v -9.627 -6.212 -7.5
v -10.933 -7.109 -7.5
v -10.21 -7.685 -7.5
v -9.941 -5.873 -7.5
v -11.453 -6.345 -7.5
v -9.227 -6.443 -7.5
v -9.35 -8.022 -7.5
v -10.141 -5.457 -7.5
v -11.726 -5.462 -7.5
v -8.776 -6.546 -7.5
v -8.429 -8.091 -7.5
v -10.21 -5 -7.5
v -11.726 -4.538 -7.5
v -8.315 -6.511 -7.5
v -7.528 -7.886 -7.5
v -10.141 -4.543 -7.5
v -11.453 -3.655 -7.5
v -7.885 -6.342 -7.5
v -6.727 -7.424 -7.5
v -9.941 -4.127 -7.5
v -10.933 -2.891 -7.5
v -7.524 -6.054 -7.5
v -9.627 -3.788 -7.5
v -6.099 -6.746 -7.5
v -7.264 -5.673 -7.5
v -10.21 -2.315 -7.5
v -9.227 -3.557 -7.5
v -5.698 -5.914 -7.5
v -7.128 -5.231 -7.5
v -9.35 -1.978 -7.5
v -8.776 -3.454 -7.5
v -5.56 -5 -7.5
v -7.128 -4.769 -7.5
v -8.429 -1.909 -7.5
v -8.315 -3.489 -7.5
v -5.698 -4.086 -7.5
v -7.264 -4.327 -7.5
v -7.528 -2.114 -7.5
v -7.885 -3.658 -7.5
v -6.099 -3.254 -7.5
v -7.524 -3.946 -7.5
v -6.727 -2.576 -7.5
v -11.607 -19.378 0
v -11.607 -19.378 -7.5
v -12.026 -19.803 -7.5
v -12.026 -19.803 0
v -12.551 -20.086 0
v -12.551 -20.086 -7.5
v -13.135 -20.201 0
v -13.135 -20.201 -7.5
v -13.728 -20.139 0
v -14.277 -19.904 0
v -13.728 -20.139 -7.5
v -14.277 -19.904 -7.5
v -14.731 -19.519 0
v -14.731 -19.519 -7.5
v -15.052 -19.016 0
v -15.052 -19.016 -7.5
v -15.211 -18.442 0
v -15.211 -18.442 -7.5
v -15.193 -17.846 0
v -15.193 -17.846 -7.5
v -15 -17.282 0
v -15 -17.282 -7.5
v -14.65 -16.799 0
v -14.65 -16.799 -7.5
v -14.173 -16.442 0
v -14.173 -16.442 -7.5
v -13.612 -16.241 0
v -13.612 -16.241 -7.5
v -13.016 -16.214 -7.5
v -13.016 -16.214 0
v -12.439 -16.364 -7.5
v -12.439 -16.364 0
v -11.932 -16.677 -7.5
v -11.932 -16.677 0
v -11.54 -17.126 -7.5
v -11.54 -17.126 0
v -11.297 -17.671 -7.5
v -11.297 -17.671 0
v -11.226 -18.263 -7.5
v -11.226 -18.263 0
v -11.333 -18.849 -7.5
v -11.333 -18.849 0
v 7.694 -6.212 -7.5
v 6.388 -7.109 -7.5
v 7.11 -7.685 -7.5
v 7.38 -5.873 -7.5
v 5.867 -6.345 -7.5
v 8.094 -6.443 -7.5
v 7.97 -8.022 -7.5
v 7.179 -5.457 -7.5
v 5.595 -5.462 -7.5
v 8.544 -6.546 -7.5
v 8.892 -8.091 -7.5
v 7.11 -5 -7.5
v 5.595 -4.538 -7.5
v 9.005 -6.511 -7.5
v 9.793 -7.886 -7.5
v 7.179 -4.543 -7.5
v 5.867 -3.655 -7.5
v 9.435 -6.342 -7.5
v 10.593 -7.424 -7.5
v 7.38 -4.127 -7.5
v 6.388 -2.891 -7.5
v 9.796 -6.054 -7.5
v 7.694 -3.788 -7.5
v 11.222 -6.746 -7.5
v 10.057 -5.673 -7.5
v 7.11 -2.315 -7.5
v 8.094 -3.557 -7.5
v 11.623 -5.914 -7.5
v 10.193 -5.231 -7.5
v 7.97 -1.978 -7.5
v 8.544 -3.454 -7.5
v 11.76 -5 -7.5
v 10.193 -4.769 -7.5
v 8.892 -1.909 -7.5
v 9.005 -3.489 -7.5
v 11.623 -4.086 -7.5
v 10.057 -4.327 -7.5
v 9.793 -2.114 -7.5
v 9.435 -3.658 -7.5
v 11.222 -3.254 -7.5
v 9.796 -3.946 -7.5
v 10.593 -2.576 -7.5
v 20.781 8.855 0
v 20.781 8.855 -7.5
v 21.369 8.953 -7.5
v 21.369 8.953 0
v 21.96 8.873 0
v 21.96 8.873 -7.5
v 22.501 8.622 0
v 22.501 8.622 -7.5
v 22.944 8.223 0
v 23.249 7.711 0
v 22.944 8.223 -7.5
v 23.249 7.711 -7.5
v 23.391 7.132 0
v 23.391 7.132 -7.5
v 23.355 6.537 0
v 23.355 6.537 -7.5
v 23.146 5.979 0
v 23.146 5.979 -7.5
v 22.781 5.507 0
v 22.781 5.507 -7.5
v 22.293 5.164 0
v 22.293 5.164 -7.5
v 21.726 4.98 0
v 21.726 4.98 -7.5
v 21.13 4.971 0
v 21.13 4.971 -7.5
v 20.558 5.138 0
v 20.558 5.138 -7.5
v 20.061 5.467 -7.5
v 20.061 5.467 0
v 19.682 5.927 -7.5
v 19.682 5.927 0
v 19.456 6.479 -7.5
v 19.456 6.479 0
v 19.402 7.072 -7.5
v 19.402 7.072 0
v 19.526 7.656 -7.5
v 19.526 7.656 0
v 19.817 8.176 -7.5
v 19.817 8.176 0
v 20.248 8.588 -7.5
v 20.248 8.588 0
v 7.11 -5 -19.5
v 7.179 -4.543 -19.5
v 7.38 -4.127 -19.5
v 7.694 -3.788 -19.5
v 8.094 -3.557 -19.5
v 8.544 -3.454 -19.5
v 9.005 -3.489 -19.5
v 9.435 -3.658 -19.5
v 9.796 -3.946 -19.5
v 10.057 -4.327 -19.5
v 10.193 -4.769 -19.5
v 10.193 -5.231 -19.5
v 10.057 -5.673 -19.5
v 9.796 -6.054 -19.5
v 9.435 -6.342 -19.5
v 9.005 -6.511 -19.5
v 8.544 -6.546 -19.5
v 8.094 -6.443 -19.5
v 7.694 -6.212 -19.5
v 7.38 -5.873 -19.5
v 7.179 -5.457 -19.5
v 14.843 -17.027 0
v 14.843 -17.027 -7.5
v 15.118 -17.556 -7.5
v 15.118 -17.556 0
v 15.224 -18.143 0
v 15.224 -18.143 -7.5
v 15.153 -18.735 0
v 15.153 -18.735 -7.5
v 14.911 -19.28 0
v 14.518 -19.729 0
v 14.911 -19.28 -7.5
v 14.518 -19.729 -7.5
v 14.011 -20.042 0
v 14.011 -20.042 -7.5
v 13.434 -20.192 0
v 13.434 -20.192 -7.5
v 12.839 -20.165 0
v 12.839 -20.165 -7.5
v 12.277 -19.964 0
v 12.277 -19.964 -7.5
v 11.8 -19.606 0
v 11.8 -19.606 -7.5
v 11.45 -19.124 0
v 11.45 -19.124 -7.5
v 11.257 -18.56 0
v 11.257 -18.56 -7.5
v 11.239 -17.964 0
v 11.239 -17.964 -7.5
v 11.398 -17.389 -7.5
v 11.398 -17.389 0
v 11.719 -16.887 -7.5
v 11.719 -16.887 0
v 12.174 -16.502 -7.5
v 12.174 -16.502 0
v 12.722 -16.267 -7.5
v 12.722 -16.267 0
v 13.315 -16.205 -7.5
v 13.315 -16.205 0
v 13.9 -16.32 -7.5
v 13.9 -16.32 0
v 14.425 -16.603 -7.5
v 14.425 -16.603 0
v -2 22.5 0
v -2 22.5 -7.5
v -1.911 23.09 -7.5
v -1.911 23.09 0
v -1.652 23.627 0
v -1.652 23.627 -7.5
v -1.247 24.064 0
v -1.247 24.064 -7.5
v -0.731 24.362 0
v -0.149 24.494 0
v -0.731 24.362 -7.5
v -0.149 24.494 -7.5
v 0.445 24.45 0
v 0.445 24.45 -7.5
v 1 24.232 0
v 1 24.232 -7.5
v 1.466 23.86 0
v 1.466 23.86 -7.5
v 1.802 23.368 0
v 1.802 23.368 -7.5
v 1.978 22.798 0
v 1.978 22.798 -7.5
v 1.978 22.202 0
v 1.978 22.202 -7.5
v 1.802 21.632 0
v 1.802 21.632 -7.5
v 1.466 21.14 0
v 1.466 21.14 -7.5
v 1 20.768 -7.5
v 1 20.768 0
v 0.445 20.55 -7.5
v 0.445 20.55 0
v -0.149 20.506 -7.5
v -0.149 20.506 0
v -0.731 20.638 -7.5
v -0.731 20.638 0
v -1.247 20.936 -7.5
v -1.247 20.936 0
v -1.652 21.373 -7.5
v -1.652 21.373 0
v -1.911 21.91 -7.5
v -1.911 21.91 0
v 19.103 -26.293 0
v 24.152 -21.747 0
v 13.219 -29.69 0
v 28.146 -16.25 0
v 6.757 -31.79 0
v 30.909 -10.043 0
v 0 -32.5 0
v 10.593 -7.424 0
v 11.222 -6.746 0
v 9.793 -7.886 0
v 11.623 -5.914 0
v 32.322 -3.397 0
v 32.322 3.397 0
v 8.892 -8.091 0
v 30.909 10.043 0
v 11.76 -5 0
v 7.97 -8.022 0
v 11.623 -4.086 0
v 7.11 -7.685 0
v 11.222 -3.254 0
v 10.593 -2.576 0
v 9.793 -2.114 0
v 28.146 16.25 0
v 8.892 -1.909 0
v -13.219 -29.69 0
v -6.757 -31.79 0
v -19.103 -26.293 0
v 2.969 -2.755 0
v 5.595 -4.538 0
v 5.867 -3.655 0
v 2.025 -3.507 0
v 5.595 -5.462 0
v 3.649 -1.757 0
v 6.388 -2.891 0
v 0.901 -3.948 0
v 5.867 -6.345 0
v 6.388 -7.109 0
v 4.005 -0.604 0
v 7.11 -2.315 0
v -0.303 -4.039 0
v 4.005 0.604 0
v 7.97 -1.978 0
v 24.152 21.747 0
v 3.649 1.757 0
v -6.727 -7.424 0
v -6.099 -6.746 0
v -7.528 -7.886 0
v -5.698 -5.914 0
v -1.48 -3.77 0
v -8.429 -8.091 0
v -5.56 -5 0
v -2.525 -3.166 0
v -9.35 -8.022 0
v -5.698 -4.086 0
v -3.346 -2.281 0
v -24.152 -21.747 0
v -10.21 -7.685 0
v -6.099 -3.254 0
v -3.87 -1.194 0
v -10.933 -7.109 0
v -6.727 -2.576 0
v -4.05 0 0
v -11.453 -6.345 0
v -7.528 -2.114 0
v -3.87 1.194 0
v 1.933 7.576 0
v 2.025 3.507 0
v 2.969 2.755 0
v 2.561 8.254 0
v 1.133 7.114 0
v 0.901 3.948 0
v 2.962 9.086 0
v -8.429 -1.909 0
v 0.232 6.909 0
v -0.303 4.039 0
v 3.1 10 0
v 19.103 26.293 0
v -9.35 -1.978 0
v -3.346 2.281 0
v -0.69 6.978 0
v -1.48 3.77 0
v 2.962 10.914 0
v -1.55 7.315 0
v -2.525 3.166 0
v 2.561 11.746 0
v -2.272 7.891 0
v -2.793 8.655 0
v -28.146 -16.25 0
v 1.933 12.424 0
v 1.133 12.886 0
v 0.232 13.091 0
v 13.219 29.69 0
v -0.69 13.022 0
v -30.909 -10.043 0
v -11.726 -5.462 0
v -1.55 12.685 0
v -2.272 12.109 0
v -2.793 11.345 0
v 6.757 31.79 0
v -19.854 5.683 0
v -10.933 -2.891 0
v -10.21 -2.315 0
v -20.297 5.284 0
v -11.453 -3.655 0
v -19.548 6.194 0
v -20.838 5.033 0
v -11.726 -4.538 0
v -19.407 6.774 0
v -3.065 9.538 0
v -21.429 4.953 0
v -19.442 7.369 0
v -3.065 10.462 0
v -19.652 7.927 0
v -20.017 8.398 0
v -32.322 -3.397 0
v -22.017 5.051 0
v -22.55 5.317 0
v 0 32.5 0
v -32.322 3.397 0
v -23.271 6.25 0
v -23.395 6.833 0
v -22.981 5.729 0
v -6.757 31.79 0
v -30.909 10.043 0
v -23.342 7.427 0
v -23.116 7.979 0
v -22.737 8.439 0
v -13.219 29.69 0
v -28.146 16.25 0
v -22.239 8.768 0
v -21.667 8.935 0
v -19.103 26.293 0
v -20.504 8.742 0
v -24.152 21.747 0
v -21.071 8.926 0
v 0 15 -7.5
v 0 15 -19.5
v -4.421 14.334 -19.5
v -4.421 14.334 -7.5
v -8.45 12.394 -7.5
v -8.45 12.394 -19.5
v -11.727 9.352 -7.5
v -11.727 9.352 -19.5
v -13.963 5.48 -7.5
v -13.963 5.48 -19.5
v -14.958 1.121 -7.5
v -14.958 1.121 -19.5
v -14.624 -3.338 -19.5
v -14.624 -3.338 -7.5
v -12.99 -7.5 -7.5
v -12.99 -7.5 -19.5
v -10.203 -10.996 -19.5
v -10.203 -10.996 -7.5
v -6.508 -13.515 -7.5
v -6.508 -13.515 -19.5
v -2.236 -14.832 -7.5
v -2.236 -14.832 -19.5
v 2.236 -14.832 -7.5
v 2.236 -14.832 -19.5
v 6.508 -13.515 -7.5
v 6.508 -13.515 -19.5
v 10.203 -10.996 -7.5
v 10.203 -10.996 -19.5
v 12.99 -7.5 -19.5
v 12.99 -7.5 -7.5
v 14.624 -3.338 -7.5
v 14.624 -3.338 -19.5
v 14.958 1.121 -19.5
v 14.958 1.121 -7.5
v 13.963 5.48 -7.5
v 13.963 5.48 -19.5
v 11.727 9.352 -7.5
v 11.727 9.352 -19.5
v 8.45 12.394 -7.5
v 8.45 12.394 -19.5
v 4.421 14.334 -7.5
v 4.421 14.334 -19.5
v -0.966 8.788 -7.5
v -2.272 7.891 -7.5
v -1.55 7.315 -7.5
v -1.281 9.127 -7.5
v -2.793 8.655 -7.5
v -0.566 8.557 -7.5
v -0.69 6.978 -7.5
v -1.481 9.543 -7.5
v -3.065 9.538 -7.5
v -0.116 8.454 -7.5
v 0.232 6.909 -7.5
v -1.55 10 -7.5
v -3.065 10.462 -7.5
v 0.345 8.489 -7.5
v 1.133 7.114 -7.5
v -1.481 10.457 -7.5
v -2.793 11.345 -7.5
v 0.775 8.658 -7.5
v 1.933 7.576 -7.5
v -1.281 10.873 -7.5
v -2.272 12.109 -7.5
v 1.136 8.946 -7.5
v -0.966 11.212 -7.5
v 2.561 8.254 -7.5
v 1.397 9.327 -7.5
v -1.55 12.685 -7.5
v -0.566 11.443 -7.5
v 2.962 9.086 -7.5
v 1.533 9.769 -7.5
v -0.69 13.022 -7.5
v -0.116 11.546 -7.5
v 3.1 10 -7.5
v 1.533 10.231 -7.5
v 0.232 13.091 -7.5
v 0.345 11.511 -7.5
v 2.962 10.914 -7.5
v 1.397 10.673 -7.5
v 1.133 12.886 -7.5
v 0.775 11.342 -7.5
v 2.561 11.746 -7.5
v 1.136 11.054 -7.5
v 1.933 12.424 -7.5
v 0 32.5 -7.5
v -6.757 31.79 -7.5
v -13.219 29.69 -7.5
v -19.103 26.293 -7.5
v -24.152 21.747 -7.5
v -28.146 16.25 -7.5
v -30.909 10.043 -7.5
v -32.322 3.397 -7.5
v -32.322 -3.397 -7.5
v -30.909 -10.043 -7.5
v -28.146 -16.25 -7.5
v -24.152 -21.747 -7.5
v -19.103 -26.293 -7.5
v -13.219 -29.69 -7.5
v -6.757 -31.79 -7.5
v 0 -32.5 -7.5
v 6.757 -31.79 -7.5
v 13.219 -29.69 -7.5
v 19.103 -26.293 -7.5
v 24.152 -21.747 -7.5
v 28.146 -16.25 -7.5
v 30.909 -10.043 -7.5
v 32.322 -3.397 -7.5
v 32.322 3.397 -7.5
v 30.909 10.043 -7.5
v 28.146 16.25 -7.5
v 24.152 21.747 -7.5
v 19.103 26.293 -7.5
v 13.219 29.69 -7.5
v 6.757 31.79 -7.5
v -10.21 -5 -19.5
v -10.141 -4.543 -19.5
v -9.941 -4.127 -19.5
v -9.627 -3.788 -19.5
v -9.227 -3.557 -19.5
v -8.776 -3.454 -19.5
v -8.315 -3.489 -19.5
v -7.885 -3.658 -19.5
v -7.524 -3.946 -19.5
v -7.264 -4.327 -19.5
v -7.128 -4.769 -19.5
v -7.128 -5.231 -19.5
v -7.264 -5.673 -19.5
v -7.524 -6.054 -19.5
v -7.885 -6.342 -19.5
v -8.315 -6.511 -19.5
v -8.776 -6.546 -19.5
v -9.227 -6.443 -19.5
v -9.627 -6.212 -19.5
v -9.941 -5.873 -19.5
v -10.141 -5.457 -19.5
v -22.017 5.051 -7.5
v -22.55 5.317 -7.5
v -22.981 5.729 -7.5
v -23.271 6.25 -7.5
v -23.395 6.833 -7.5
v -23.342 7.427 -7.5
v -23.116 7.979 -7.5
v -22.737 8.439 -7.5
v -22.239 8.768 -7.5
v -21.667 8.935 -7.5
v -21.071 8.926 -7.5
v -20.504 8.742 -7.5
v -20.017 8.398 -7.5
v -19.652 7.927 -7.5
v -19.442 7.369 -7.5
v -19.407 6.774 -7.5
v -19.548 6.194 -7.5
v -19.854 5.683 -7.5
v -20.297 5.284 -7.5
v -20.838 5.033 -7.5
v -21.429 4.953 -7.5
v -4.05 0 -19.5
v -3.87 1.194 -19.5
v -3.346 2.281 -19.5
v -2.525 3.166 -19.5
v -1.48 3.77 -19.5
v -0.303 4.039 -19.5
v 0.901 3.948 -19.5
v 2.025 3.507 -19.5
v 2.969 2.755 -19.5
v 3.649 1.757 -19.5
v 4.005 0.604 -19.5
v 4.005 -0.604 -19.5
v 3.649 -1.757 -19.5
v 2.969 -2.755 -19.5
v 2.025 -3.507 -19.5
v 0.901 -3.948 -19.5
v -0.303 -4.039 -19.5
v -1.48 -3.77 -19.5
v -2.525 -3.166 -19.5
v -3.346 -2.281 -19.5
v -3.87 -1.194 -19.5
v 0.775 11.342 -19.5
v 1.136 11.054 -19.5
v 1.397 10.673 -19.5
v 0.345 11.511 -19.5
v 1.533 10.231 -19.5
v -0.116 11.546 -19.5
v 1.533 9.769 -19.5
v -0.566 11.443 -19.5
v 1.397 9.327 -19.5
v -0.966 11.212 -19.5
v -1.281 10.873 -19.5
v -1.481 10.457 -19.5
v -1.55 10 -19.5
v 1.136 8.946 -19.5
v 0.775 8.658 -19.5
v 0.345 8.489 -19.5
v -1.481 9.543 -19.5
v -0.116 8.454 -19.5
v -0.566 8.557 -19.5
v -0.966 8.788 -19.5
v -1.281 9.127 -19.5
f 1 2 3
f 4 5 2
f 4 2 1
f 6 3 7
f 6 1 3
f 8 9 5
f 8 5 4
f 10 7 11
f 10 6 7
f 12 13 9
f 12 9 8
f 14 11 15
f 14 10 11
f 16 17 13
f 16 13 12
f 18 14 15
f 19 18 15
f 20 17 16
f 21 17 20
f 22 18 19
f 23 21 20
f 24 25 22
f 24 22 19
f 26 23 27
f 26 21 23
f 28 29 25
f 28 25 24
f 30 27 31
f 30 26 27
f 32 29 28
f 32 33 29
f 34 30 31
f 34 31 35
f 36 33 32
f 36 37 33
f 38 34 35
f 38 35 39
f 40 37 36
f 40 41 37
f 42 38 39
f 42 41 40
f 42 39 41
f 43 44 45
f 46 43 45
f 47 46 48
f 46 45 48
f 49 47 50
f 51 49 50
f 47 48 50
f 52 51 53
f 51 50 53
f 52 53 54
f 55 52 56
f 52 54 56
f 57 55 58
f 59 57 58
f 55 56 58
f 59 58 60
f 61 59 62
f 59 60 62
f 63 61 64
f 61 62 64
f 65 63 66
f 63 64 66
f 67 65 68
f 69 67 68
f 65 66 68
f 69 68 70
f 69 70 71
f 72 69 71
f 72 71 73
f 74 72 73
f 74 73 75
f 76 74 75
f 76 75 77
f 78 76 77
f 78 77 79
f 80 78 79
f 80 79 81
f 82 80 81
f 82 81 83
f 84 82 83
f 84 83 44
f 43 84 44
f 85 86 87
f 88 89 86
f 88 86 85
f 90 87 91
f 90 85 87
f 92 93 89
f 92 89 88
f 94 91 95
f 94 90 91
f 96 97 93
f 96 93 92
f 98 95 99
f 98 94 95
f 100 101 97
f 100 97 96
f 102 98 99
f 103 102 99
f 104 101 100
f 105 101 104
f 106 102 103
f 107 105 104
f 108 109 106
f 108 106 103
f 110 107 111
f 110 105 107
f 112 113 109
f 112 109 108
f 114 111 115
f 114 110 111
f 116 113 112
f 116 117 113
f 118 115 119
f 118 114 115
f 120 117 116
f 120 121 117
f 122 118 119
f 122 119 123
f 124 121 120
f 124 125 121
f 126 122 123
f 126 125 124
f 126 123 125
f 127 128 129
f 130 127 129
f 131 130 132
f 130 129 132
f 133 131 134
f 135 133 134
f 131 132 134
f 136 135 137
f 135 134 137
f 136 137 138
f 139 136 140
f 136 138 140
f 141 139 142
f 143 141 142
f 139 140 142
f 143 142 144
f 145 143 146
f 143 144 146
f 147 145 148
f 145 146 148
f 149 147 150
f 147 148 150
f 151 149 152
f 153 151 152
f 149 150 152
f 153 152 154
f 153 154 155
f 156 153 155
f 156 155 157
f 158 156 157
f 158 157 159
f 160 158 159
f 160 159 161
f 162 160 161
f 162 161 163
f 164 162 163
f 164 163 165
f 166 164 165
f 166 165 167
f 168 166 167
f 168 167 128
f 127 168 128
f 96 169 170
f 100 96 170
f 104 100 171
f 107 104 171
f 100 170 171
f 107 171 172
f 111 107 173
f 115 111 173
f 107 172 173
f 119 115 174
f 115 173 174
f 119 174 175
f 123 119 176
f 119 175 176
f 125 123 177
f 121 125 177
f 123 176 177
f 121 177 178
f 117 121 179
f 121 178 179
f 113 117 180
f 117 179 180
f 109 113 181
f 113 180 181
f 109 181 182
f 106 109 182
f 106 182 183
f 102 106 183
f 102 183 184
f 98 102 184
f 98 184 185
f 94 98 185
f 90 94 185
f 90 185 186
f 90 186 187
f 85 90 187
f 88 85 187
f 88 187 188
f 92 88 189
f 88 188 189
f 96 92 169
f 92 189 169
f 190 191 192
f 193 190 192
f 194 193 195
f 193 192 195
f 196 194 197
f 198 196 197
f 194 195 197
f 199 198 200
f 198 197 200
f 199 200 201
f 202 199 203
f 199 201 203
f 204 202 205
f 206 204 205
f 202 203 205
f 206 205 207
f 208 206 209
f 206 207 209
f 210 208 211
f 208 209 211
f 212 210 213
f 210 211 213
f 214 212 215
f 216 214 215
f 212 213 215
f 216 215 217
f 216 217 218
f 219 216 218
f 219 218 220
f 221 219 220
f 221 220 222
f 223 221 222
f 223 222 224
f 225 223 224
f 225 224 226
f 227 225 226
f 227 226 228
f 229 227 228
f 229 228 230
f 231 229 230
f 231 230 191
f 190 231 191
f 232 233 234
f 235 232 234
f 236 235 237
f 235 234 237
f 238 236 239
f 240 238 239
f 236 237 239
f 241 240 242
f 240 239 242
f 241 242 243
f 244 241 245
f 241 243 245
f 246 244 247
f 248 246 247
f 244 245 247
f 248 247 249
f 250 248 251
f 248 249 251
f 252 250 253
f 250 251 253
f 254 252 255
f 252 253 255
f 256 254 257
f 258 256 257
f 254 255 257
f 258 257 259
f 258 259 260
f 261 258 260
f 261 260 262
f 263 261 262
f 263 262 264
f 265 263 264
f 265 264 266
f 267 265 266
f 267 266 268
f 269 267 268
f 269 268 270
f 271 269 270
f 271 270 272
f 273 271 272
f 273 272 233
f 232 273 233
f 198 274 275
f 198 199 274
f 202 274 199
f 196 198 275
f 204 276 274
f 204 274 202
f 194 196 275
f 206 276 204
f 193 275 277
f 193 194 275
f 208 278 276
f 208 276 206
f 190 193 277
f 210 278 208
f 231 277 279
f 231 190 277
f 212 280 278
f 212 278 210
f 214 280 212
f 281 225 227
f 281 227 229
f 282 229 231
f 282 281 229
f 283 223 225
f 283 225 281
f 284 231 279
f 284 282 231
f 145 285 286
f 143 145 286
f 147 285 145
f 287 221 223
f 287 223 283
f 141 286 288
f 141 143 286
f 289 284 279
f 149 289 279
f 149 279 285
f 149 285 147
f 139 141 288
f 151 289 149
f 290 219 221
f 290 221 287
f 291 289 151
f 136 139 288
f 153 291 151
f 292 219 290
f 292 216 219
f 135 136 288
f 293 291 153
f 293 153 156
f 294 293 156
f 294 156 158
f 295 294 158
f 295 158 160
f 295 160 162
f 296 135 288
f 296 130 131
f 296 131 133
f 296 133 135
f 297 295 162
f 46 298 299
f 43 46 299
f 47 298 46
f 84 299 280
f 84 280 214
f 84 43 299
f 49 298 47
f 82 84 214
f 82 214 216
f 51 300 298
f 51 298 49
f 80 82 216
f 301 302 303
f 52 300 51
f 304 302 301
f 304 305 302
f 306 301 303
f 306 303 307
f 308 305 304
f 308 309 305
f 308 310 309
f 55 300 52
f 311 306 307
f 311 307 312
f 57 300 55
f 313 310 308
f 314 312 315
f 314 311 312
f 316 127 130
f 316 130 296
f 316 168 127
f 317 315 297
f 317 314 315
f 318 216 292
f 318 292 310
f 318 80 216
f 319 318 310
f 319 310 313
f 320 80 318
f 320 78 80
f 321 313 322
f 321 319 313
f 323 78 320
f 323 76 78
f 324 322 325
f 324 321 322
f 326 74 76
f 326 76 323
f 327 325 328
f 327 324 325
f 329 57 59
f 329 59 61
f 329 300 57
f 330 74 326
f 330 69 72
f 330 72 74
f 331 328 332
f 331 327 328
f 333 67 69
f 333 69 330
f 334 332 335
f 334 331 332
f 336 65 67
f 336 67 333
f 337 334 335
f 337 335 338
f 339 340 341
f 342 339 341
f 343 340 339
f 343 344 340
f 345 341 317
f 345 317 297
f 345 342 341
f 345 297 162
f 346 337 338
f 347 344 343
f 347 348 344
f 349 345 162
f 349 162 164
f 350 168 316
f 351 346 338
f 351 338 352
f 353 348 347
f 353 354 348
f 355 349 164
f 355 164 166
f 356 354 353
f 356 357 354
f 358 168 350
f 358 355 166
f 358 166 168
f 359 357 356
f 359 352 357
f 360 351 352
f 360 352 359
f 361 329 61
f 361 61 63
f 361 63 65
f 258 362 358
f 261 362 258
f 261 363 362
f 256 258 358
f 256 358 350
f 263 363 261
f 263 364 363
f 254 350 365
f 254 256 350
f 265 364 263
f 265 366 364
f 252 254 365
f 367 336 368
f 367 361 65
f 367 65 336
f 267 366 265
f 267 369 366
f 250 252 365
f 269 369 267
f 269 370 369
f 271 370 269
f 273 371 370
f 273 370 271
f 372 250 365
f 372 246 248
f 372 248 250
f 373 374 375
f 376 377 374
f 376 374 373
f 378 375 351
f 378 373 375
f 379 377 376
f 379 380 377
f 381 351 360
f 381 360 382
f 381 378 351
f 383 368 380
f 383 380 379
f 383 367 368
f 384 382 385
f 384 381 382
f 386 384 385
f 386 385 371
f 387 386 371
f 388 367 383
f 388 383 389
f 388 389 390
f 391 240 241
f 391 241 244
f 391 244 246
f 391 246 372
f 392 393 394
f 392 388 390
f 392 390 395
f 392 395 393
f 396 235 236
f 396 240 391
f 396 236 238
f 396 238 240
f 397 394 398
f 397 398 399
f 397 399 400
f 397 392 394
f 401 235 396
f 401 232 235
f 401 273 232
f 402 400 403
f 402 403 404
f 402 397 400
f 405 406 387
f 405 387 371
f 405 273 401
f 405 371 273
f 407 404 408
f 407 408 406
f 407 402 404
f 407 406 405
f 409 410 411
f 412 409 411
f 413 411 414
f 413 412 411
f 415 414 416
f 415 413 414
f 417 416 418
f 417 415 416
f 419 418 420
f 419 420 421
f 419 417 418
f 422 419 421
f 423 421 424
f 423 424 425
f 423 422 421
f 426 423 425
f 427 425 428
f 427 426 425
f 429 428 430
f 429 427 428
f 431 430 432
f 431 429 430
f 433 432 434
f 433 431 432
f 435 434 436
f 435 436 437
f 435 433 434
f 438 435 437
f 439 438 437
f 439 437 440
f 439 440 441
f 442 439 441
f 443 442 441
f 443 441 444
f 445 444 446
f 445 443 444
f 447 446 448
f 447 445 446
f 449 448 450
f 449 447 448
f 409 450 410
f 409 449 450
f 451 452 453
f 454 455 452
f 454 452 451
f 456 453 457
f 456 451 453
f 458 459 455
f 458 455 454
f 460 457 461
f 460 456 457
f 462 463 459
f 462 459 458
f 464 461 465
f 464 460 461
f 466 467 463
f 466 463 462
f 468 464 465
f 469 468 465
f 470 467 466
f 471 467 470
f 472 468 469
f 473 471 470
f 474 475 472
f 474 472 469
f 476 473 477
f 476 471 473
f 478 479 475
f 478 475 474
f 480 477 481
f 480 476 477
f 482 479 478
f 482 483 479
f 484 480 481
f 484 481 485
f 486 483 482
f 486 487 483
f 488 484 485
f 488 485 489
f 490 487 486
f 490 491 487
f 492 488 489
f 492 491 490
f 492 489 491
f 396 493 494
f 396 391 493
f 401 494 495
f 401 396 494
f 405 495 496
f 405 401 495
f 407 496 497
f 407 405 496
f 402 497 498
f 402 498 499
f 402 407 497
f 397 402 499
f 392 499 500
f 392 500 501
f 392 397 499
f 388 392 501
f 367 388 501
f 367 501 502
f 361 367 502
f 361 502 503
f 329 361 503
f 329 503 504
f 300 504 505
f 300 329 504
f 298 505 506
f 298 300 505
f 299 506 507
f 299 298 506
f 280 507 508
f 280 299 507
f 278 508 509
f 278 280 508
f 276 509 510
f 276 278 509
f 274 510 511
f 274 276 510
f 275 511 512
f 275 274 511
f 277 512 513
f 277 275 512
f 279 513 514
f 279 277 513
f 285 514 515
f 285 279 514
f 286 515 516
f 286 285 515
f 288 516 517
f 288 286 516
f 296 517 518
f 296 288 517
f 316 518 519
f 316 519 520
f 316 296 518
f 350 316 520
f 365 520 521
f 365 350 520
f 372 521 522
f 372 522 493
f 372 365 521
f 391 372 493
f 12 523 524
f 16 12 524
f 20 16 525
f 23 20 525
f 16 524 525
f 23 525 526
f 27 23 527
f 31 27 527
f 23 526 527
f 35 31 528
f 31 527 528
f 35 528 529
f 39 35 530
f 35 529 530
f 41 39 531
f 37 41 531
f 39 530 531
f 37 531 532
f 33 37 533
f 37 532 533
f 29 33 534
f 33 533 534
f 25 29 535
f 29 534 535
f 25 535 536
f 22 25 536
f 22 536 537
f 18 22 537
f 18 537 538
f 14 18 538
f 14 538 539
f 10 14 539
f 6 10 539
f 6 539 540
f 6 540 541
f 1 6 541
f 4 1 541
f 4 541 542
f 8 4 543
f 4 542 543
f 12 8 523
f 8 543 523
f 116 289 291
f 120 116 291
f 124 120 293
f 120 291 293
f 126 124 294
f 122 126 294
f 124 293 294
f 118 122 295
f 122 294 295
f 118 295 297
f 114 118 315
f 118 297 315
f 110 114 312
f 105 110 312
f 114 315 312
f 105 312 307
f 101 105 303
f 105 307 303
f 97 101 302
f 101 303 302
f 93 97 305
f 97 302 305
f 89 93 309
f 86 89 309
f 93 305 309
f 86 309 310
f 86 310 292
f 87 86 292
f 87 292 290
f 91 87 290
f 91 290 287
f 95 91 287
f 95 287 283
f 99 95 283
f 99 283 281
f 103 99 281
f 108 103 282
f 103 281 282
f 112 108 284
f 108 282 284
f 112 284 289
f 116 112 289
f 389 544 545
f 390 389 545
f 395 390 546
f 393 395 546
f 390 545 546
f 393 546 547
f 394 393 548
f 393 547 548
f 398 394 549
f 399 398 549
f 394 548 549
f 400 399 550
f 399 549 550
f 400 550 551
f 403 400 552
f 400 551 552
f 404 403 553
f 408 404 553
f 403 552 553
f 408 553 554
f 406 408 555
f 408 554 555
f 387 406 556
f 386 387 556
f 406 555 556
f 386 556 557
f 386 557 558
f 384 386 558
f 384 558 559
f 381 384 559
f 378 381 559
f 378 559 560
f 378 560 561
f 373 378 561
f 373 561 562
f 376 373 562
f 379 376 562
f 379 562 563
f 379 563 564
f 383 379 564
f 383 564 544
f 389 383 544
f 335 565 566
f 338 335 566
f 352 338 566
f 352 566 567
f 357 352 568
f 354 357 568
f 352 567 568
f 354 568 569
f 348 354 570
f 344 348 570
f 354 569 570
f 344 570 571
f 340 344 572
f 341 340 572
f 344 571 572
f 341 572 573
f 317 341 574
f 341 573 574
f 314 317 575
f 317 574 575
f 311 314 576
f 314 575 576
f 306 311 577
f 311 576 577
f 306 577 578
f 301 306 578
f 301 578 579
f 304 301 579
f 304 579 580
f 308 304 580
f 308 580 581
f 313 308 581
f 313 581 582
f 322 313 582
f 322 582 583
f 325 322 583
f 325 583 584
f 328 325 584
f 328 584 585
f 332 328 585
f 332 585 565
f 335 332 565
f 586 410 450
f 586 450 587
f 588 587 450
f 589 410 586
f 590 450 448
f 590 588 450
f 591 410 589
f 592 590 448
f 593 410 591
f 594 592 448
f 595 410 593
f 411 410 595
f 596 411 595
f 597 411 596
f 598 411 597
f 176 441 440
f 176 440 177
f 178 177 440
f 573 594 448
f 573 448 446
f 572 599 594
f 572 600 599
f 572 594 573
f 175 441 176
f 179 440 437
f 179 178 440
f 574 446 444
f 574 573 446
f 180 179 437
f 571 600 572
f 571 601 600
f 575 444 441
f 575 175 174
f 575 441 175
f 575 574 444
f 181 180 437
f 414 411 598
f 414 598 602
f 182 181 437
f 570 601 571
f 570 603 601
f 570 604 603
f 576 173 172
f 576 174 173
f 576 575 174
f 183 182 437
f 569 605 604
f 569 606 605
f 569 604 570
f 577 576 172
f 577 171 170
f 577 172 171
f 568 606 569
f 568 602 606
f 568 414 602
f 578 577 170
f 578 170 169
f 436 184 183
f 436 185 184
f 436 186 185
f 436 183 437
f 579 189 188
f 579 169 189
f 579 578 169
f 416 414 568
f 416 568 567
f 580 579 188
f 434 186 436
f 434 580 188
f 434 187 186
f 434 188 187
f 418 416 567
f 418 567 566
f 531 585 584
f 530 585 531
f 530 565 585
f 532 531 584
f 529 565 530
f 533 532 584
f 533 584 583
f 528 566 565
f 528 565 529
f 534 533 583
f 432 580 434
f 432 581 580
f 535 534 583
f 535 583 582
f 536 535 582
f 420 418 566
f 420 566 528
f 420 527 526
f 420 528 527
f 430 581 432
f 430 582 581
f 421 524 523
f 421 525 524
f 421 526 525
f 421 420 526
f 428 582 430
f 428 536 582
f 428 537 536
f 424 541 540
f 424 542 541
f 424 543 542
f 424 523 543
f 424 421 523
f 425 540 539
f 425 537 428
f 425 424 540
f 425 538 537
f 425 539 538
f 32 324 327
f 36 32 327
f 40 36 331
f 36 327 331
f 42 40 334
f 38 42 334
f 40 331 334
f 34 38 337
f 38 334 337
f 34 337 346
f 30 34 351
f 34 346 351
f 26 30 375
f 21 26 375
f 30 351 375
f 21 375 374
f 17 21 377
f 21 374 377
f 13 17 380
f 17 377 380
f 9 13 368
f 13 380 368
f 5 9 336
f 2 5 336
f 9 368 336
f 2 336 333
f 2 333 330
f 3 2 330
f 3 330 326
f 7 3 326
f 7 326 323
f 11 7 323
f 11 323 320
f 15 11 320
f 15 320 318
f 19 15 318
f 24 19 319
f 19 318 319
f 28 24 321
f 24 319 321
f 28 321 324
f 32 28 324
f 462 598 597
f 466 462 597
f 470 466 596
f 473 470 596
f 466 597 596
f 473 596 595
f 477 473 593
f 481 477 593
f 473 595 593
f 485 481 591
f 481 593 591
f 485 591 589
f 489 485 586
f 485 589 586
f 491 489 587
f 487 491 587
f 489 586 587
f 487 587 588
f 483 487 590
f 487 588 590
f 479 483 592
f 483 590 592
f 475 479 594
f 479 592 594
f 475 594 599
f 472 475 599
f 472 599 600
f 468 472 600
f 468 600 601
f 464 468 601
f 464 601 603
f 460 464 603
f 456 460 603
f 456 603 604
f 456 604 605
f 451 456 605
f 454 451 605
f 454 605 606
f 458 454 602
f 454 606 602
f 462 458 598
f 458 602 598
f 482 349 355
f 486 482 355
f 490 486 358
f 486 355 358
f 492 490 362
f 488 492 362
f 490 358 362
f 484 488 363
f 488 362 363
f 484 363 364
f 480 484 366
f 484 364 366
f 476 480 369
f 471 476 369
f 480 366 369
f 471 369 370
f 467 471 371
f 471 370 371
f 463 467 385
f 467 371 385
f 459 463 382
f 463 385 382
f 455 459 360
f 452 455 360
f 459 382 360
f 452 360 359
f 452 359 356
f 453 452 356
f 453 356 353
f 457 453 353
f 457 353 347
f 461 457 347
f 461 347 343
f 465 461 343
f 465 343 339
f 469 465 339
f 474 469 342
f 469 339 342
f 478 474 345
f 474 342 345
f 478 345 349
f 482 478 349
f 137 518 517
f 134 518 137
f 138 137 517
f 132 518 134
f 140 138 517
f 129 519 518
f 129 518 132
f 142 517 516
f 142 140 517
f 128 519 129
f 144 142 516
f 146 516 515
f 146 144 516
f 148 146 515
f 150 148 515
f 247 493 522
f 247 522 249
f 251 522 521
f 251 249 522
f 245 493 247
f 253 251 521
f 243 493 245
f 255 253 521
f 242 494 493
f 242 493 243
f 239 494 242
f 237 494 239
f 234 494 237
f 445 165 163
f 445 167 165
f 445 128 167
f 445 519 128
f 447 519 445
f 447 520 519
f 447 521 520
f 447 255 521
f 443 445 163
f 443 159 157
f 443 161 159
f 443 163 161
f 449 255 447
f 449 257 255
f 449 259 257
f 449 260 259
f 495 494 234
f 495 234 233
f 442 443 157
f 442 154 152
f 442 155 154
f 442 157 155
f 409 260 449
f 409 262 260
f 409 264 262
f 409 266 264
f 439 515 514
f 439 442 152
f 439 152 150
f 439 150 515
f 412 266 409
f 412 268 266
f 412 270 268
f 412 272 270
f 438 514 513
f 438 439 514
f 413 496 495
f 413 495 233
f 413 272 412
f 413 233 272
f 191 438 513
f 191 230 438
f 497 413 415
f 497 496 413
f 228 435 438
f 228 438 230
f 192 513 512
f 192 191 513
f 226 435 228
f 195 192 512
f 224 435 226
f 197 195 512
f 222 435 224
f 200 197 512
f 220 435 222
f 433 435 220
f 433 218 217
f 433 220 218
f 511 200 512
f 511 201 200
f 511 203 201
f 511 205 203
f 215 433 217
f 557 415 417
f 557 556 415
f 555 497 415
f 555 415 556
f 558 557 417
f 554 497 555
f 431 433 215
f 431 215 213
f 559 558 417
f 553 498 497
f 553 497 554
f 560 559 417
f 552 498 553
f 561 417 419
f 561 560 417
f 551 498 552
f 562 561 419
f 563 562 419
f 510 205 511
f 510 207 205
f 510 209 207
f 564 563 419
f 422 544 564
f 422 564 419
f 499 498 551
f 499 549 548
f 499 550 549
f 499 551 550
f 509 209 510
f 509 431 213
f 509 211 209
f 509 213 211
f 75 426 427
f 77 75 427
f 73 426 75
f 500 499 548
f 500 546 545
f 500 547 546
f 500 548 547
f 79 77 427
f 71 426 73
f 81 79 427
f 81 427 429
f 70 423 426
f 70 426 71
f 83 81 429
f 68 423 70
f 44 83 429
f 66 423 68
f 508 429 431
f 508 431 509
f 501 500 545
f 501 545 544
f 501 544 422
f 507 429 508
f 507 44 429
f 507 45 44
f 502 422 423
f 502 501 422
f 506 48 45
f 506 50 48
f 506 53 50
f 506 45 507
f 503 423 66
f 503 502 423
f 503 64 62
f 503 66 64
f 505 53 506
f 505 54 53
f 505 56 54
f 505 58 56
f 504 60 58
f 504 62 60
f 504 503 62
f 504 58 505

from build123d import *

# Parameters (mm, degrees)
F_4_0_4_HEAT_INSERT_M3_D         = 4
F_8_1_8_1_DURCHMESSER_BOHRUNG1_D = 8.1
SKIZZE8_R                        = 1.55
SCHNITT_LINEAR_AUSTRAGEN1_DEPTH  = 12
KREISMUSTER1_COUNT               = 5
SKIZZE9_R                        = 3.1
SCHNITT_LINEAR_AUSTRAGEN2_DEPTH  = 7.5


with BuildPart() as part:
    # Skizze1 → Rotation1 (revolve)
    with BuildSketch(Plane(origin=(0, 0, 0), x_dir=(0, 0, -1), z_dir=(1, 0, 0))):
        Polygon((0, 0), (19.5, 0), (19.5, 15), (7.5, 15), (7.5, 32.5), (0, 32.5), align=None)
    revolve(axis=Axis((0, 0, 0), (0, 0, 1)))

    # Ø4.0 (4) Heat Insert M3 (through all)
    with Locations(Plane.XY):
        with Locations((0, 22.5)):
            f_4_0_4_heat_insert_m3 = Hole(F_4_0_4_HEAT_INSERT_M3_D / 2)

    # Ø8.1 (8.1) Durchmesser Bohrung1 (through all)
    with Locations(Plane.XY):
        with Locations((0, 0)):
            Hole(F_8_1_8_1_DURCHMESSER_BOHRUNG1_D / 2)

    # Skizze8 → Schnitt-Linear austragen1 (cut)
    with BuildSketch(Plane(origin=(0, 0, -19.5), x_dir=(-1, 0, 0), z_dir=(0, 0, -1))):
        with Locations((0, 10)):
            Circle(SKIZZE8_R)
        with Locations((8.660254038, -5)):
            Circle(SKIZZE8_R)
        with Locations((-8.660254038, -5)):
            Circle(SKIZZE8_R)
    extrude(amount=-SCHNITT_LINEAR_AUSTRAGEN1_DEPTH, mode=Mode.SUBTRACT)

    # Kreismuster1: Ø4.0 (4) Heat Insert M3 ×5 about axis
    kreismuster1_axis = Axis((0, 0, 0), (0, 0, 1))
    for i in range(1, KREISMUSTER1_COUNT):
        add(f_4_0_4_heat_insert_m3.rotate(kreismuster1_axis, i * 360 / KREISMUSTER1_COUNT), mode=Mode.SUBTRACT)

    # Skizze9 → Schnitt-Linear austragen2 (cut)
    with BuildSketch(Plane.XY):
        with Locations((0, 10)):
            Circle(SKIZZE9_R)
        with Locations((8.660254038, -5)):
            Circle(SKIZZE9_R)
        with Locations((-8.660254038, -5)):
            Circle(SKIZZE9_R)
    extrude(amount=-SCHNITT_LINEAR_AUSTRAGEN2_DEPTH, mode=Mode.SUBTRACT)


solid = part.part
